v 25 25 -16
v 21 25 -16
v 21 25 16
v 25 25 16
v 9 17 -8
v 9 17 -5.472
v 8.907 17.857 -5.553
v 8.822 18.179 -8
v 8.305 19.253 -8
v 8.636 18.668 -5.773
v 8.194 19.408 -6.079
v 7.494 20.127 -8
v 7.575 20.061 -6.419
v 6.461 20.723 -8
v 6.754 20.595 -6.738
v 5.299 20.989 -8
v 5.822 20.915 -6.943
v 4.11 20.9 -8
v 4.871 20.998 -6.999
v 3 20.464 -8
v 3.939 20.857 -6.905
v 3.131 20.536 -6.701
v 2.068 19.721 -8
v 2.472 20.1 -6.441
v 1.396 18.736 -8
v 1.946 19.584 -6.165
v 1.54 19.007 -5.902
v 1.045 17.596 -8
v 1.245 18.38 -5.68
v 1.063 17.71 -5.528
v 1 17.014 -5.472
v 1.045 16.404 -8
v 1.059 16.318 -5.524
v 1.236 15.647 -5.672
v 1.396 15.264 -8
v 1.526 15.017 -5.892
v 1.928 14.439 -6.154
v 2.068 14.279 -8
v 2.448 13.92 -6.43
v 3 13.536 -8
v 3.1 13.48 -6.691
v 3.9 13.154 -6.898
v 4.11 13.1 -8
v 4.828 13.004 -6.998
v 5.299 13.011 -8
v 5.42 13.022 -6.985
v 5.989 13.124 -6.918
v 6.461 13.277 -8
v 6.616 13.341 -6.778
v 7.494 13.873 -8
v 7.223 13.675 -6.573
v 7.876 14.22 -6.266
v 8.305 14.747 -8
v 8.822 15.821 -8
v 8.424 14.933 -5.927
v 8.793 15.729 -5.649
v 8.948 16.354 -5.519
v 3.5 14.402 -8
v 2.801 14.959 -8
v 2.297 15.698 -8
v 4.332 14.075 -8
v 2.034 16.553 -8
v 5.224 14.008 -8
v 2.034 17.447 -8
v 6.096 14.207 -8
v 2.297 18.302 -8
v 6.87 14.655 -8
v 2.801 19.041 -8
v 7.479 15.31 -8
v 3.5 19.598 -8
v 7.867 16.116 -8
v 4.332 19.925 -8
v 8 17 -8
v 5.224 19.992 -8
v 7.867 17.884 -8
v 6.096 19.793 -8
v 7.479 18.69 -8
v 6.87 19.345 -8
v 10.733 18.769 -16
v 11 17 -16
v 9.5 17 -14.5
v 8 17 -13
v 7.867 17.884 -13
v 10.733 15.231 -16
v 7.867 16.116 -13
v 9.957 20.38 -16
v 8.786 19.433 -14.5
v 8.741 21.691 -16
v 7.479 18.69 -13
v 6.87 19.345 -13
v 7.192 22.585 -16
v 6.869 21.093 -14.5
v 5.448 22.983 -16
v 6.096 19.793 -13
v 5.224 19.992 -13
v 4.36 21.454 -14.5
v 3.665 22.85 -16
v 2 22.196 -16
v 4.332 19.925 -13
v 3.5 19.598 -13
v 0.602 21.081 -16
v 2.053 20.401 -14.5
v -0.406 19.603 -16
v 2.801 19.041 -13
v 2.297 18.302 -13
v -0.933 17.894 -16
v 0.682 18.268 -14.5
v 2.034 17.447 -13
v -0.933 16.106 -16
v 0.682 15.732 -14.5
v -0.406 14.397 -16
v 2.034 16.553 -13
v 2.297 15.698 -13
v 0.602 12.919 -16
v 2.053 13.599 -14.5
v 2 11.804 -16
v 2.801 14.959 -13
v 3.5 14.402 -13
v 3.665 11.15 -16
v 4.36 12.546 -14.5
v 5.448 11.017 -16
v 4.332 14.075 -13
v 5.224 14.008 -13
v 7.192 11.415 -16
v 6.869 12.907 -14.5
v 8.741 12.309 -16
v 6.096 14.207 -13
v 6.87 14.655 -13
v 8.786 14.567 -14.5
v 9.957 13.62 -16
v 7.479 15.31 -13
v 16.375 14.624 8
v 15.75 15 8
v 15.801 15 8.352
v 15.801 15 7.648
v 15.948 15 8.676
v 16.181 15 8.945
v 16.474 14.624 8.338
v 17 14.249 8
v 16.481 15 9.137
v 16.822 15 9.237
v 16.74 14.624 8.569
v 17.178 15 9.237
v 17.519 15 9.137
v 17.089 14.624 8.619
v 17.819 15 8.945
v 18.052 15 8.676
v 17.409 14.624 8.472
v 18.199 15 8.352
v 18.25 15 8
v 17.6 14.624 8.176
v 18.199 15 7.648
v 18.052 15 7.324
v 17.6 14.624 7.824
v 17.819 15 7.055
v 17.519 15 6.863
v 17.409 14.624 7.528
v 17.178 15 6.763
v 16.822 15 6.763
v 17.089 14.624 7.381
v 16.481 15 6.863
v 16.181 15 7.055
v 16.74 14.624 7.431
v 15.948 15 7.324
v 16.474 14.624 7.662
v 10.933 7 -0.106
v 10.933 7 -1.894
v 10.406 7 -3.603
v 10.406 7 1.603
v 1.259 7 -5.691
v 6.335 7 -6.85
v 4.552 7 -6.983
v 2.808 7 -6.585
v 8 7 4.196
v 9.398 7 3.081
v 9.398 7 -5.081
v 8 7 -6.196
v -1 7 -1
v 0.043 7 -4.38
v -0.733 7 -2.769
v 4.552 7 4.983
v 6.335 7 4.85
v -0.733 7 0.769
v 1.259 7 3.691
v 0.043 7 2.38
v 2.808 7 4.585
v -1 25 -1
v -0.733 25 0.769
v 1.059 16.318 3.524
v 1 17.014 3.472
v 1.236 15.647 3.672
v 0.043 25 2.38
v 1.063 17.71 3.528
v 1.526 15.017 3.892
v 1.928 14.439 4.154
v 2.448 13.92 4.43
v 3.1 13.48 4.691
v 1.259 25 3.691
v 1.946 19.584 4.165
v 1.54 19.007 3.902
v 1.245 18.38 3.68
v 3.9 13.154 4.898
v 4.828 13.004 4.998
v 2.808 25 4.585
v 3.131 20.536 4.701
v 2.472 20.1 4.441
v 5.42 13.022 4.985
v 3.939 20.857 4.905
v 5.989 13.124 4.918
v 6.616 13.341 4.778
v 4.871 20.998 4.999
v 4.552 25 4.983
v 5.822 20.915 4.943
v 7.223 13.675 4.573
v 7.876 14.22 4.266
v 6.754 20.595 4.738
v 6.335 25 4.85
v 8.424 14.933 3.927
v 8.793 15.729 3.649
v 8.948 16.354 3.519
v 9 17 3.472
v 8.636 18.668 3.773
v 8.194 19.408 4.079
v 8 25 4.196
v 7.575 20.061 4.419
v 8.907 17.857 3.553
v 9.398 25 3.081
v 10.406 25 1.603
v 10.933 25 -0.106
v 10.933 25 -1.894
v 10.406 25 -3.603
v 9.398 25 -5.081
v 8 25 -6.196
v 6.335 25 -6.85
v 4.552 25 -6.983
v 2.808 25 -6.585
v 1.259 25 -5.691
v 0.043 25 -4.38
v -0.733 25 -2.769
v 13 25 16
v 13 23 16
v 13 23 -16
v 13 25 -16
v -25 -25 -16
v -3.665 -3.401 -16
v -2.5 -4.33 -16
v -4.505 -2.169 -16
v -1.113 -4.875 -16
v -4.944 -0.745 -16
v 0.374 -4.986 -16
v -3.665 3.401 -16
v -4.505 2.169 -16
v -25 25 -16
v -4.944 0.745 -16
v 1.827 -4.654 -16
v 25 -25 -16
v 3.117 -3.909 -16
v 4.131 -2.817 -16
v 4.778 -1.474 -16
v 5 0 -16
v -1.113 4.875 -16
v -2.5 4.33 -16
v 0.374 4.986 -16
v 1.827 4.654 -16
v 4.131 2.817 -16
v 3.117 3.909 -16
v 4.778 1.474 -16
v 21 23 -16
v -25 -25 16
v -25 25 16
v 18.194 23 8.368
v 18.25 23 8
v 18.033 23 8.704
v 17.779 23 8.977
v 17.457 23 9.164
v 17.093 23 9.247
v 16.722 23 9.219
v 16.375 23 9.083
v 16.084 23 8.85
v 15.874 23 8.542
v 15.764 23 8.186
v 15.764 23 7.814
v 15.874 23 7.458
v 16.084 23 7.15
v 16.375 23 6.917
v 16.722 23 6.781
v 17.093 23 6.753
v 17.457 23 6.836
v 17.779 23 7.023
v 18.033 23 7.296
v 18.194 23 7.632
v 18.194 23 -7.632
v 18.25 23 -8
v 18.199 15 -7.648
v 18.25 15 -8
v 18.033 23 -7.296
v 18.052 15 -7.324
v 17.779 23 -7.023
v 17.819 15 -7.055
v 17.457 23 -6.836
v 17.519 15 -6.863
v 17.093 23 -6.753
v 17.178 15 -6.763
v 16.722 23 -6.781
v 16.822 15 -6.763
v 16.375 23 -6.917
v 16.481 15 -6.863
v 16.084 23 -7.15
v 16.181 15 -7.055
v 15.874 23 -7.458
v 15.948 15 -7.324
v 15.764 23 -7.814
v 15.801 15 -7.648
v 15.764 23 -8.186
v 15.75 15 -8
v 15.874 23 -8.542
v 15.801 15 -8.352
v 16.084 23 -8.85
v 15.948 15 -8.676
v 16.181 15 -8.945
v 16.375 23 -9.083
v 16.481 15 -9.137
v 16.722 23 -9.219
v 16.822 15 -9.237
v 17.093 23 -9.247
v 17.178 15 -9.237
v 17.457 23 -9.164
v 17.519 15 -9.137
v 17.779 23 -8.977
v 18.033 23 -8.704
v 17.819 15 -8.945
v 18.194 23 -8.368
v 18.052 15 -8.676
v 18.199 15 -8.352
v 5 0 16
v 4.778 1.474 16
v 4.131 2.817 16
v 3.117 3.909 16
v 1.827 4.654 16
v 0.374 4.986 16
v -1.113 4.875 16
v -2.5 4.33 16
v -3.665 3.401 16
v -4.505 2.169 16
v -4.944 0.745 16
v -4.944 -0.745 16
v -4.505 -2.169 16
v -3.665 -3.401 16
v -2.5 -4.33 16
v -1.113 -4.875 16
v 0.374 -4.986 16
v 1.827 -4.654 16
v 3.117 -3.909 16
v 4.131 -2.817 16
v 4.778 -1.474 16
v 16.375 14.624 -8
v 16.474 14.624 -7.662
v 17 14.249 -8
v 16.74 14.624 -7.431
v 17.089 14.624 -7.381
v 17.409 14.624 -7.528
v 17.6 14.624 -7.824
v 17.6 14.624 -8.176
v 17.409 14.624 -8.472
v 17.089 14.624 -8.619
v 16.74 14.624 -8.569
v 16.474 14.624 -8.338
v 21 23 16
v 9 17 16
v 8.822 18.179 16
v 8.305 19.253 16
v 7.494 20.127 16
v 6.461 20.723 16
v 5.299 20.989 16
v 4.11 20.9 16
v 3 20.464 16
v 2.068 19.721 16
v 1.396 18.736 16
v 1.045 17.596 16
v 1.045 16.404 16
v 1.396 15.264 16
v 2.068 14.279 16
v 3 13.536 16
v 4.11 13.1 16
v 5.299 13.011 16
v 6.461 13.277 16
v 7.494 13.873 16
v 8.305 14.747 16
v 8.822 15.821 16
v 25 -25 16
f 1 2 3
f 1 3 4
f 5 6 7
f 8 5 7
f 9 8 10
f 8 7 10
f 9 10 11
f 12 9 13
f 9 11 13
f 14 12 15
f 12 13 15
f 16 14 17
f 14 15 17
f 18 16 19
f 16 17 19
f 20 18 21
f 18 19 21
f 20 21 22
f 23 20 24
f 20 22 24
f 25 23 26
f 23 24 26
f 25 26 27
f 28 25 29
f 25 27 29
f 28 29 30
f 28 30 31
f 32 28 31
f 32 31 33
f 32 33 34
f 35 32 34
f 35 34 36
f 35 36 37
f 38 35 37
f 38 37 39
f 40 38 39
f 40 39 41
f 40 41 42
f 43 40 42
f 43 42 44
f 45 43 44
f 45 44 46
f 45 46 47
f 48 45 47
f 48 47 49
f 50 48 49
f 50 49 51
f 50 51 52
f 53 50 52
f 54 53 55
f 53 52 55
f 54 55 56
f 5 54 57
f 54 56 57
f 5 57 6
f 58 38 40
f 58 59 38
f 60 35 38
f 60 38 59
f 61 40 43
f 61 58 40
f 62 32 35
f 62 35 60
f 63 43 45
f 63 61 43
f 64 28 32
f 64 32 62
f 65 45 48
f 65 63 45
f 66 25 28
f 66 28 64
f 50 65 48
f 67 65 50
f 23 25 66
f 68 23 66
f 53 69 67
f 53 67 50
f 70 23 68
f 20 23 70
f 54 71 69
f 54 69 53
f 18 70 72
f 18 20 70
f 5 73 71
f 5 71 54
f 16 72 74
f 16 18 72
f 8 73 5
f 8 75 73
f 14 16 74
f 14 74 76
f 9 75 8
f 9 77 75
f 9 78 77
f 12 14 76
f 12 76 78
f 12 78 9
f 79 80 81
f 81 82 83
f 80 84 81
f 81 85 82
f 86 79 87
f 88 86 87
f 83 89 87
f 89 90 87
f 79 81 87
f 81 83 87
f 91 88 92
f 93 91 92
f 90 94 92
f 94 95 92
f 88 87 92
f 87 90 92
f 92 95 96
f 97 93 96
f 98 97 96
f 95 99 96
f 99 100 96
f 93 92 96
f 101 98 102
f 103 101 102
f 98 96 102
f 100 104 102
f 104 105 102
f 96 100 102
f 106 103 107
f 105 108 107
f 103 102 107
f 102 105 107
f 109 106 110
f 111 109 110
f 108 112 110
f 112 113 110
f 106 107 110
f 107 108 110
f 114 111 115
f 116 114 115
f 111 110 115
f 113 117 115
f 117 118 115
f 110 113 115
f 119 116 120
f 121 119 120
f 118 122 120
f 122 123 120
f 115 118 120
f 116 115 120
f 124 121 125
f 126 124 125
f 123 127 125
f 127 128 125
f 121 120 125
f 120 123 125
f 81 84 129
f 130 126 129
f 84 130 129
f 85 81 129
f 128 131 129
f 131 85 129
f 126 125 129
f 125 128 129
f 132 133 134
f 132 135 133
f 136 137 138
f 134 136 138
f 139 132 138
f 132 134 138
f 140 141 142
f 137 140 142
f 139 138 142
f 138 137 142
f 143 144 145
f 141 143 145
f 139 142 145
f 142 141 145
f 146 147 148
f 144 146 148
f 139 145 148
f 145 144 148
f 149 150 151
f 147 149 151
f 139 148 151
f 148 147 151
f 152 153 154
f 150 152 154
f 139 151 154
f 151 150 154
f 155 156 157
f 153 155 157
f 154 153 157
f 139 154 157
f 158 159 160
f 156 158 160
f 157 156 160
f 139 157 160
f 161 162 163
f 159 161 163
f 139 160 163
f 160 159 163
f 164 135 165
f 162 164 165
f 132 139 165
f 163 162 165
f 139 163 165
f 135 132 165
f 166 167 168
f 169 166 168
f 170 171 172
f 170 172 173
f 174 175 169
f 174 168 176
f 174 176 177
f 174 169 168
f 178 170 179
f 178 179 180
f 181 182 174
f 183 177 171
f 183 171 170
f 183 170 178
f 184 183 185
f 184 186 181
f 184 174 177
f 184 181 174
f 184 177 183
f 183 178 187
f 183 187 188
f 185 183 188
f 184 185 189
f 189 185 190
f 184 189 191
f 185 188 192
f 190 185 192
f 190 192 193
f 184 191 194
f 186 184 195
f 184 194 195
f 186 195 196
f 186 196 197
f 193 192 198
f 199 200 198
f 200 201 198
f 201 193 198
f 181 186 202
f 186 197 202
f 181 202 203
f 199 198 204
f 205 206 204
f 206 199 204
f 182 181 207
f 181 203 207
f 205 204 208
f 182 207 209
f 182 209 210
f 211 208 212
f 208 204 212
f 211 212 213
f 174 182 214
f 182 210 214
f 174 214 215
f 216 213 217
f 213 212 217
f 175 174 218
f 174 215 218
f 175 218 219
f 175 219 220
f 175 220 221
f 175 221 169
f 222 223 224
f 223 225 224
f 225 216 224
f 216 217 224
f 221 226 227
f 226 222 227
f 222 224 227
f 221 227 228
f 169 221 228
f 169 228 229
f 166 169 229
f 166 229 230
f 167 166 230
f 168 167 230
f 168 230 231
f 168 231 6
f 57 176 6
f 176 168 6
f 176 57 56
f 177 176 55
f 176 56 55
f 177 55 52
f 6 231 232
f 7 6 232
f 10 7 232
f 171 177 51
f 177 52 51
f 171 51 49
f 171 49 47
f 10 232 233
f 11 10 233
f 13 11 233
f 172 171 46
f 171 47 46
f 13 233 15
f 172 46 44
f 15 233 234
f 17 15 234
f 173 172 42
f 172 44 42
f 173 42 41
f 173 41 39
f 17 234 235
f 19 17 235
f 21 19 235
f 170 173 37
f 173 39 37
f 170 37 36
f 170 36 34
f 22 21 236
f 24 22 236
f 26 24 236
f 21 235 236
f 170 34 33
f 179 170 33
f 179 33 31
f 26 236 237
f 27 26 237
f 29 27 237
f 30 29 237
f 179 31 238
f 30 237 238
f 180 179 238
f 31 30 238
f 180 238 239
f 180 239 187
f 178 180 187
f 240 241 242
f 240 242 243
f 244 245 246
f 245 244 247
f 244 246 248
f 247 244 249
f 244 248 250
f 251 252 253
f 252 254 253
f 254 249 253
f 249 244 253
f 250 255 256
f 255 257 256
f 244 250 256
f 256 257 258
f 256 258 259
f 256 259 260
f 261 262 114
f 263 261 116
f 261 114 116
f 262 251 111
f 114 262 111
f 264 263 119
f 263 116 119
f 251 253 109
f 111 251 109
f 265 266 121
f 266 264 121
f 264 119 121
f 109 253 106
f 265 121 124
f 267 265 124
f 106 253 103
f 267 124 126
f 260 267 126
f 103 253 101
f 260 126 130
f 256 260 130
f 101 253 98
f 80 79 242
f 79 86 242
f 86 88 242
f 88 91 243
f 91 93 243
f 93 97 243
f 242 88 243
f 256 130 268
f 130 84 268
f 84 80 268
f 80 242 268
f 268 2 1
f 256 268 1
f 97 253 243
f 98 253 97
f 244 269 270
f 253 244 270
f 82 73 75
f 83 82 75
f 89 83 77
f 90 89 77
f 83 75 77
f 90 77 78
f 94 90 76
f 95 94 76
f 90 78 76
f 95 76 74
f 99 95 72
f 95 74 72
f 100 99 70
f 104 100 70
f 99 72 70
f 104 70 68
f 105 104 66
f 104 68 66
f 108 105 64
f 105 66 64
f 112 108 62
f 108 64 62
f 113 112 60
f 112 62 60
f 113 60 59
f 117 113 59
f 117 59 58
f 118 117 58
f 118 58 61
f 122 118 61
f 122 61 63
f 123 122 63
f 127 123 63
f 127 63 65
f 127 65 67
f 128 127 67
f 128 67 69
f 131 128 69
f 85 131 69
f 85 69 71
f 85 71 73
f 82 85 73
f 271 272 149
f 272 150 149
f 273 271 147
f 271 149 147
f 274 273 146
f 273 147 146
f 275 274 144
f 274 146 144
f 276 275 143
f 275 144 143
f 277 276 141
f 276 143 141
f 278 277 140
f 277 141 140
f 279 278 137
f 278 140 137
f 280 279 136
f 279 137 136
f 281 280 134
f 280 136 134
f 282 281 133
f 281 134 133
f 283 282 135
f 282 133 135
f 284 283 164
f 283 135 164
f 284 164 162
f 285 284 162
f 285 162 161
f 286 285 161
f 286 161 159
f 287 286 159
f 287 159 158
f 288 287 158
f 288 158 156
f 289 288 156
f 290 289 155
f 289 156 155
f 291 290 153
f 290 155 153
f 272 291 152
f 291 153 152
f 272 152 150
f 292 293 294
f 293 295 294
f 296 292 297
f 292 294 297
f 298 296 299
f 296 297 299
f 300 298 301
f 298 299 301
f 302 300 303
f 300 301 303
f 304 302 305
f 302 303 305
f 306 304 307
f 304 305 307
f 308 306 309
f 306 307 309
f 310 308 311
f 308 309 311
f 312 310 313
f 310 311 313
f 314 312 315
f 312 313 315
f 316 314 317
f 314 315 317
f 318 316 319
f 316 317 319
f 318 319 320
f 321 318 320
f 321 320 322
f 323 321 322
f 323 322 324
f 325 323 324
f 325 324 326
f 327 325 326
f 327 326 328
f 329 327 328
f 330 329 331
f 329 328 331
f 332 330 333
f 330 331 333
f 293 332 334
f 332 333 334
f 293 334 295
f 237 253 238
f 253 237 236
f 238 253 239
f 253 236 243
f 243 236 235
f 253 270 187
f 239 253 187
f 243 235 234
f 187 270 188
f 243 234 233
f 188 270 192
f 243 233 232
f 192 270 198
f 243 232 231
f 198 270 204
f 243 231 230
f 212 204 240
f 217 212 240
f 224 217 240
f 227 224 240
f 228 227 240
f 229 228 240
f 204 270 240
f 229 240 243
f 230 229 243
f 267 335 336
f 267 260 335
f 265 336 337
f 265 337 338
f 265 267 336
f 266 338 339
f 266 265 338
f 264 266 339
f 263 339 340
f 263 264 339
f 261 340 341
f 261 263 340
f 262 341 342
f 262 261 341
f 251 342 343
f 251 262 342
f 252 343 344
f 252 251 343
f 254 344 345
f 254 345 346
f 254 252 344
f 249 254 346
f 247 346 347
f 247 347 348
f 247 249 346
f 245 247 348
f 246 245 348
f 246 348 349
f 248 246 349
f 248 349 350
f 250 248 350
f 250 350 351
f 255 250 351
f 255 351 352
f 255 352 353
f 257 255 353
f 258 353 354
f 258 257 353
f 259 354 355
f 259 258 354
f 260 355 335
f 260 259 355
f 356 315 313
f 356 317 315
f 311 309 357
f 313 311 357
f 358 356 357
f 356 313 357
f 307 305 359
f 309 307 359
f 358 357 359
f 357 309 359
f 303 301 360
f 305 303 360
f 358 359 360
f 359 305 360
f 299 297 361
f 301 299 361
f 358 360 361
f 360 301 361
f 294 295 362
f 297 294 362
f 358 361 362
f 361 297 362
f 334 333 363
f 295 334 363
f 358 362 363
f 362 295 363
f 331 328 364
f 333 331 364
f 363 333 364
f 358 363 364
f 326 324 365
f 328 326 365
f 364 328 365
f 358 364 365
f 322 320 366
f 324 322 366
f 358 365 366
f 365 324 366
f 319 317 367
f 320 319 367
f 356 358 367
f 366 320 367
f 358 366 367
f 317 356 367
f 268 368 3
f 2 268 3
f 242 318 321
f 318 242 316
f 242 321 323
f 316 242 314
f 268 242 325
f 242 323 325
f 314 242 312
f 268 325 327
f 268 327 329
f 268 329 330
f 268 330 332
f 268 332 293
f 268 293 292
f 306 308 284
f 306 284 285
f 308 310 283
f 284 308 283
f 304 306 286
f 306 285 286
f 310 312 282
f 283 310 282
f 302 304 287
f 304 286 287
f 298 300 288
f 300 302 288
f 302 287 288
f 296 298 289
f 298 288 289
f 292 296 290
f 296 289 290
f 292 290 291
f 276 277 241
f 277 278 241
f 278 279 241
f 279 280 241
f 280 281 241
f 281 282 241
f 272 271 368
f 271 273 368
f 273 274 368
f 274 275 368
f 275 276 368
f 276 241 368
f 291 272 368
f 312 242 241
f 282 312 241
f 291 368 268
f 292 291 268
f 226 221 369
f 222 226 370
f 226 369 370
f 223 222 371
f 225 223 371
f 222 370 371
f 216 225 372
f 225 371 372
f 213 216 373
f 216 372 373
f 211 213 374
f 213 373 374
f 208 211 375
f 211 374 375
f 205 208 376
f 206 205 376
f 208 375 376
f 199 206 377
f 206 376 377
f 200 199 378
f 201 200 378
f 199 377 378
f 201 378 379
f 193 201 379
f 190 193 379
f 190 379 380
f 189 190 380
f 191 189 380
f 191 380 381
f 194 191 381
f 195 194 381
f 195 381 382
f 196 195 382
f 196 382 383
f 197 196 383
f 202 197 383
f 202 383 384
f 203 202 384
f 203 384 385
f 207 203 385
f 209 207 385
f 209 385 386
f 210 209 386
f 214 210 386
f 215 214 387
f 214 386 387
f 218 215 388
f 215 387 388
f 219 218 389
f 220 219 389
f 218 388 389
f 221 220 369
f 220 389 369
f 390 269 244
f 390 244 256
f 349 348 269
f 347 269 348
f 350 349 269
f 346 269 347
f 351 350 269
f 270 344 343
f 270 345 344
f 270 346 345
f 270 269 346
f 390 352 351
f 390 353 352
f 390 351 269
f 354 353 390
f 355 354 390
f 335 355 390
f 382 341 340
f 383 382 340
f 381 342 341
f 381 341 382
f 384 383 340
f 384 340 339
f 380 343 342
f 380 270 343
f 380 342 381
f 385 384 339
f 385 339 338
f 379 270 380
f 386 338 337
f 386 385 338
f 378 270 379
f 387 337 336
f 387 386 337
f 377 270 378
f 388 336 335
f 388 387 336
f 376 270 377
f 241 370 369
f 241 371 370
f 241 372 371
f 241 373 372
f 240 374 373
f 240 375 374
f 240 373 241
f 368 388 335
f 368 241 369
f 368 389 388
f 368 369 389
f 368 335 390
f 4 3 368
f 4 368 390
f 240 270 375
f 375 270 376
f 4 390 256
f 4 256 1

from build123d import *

# Parameters (mm, degrees)
F0_W      = 50
F0_H      = 50
F0_R      = 5
F1_DEPTH  = 16
F2_W      = 8
F2_H      = 2
F3_DEPTH  = 32.001
F4_R      = 3
F5_DEPTH  = 32.001
F6_R      = 4
F6_R_2    = 3
F7_DEPTH  = 24
F8_R      = 6
F9_DEPTH  = 18
F10_SIZE2 = 3
F10_SIZE  = 3
F12_D     = 2.5
F12_DEPTH = 8
F12_TIP   = 0.7510757738


with BuildPart() as f1:
    # F0 (on Top) → F1 (new body, symmetric)
    with BuildSketch(Plane.XY):
        Rectangle(F0_W, F0_H)
        Circle(F0_R, mode=Mode.SUBTRACT)
    extrude(amount=F1_DEPTH, both=True)

    # F2 (on face) → F3 (cut, through all)
    with BuildSketch(Plane.XY.offset(16)):
        with Locations((17, 24)):
            Rectangle(F2_W, F2_H)
    extrude(amount=-F3_DEPTH, mode=Mode.SUBTRACT)

    # F4 (on face) → F5 (cut, through all)
    with BuildSketch(Plane.XY.offset(16)):
        with Locations((5, 17)):
            Circle(F4_R)
    extrude(amount=-F5_DEPTH, mode=Mode.SUBTRACT)

    # F6 (on face) → F7 (cut)
    with BuildSketch(Plane.XY.offset(16)):
        with Locations((5, 17)):
            Circle(F6_R)
        with Locations((5, 17)):
            Circle(F6_R_2, mode=Mode.SUBTRACT)
    extrude(amount=-F7_DEPTH, mode=Mode.SUBTRACT)

    # F8 (on face) → F9 (cut)
    with BuildSketch(Plane(origin=(0, 25, 0), x_dir=(-1, 0, 0), z_dir=(0, 1, 0))):
        with Locations((-5, -1)):
            Circle(F8_R)
    extrude(amount=-F9_DEPTH, mode=Mode.SUBTRACT)

    # F10
    f10_edges = [f1.edges().sort_by_distance(p)[0] for p in [
        (2, 17, -16),
    ]]
    chamfer(f10_edges, length=F10_SIZE, length2=F10_SIZE2)

    # F12
    with Locations(Plane(origin=(0, 23, 0), x_dir=(-1, 0, 0), z_dir=(0, 1, 0))):
        with Locations((-17, 8), (-17, -8)):
            Hole(F12_D / 2, depth=F12_DEPTH)
            with Locations((0, 0, -(F12_DEPTH + F12_TIP / 2))):  # 118° drill point
                Cone(0, F12_D / 2, F12_TIP, mode=Mode.SUBTRACT)


solid = f1.part
